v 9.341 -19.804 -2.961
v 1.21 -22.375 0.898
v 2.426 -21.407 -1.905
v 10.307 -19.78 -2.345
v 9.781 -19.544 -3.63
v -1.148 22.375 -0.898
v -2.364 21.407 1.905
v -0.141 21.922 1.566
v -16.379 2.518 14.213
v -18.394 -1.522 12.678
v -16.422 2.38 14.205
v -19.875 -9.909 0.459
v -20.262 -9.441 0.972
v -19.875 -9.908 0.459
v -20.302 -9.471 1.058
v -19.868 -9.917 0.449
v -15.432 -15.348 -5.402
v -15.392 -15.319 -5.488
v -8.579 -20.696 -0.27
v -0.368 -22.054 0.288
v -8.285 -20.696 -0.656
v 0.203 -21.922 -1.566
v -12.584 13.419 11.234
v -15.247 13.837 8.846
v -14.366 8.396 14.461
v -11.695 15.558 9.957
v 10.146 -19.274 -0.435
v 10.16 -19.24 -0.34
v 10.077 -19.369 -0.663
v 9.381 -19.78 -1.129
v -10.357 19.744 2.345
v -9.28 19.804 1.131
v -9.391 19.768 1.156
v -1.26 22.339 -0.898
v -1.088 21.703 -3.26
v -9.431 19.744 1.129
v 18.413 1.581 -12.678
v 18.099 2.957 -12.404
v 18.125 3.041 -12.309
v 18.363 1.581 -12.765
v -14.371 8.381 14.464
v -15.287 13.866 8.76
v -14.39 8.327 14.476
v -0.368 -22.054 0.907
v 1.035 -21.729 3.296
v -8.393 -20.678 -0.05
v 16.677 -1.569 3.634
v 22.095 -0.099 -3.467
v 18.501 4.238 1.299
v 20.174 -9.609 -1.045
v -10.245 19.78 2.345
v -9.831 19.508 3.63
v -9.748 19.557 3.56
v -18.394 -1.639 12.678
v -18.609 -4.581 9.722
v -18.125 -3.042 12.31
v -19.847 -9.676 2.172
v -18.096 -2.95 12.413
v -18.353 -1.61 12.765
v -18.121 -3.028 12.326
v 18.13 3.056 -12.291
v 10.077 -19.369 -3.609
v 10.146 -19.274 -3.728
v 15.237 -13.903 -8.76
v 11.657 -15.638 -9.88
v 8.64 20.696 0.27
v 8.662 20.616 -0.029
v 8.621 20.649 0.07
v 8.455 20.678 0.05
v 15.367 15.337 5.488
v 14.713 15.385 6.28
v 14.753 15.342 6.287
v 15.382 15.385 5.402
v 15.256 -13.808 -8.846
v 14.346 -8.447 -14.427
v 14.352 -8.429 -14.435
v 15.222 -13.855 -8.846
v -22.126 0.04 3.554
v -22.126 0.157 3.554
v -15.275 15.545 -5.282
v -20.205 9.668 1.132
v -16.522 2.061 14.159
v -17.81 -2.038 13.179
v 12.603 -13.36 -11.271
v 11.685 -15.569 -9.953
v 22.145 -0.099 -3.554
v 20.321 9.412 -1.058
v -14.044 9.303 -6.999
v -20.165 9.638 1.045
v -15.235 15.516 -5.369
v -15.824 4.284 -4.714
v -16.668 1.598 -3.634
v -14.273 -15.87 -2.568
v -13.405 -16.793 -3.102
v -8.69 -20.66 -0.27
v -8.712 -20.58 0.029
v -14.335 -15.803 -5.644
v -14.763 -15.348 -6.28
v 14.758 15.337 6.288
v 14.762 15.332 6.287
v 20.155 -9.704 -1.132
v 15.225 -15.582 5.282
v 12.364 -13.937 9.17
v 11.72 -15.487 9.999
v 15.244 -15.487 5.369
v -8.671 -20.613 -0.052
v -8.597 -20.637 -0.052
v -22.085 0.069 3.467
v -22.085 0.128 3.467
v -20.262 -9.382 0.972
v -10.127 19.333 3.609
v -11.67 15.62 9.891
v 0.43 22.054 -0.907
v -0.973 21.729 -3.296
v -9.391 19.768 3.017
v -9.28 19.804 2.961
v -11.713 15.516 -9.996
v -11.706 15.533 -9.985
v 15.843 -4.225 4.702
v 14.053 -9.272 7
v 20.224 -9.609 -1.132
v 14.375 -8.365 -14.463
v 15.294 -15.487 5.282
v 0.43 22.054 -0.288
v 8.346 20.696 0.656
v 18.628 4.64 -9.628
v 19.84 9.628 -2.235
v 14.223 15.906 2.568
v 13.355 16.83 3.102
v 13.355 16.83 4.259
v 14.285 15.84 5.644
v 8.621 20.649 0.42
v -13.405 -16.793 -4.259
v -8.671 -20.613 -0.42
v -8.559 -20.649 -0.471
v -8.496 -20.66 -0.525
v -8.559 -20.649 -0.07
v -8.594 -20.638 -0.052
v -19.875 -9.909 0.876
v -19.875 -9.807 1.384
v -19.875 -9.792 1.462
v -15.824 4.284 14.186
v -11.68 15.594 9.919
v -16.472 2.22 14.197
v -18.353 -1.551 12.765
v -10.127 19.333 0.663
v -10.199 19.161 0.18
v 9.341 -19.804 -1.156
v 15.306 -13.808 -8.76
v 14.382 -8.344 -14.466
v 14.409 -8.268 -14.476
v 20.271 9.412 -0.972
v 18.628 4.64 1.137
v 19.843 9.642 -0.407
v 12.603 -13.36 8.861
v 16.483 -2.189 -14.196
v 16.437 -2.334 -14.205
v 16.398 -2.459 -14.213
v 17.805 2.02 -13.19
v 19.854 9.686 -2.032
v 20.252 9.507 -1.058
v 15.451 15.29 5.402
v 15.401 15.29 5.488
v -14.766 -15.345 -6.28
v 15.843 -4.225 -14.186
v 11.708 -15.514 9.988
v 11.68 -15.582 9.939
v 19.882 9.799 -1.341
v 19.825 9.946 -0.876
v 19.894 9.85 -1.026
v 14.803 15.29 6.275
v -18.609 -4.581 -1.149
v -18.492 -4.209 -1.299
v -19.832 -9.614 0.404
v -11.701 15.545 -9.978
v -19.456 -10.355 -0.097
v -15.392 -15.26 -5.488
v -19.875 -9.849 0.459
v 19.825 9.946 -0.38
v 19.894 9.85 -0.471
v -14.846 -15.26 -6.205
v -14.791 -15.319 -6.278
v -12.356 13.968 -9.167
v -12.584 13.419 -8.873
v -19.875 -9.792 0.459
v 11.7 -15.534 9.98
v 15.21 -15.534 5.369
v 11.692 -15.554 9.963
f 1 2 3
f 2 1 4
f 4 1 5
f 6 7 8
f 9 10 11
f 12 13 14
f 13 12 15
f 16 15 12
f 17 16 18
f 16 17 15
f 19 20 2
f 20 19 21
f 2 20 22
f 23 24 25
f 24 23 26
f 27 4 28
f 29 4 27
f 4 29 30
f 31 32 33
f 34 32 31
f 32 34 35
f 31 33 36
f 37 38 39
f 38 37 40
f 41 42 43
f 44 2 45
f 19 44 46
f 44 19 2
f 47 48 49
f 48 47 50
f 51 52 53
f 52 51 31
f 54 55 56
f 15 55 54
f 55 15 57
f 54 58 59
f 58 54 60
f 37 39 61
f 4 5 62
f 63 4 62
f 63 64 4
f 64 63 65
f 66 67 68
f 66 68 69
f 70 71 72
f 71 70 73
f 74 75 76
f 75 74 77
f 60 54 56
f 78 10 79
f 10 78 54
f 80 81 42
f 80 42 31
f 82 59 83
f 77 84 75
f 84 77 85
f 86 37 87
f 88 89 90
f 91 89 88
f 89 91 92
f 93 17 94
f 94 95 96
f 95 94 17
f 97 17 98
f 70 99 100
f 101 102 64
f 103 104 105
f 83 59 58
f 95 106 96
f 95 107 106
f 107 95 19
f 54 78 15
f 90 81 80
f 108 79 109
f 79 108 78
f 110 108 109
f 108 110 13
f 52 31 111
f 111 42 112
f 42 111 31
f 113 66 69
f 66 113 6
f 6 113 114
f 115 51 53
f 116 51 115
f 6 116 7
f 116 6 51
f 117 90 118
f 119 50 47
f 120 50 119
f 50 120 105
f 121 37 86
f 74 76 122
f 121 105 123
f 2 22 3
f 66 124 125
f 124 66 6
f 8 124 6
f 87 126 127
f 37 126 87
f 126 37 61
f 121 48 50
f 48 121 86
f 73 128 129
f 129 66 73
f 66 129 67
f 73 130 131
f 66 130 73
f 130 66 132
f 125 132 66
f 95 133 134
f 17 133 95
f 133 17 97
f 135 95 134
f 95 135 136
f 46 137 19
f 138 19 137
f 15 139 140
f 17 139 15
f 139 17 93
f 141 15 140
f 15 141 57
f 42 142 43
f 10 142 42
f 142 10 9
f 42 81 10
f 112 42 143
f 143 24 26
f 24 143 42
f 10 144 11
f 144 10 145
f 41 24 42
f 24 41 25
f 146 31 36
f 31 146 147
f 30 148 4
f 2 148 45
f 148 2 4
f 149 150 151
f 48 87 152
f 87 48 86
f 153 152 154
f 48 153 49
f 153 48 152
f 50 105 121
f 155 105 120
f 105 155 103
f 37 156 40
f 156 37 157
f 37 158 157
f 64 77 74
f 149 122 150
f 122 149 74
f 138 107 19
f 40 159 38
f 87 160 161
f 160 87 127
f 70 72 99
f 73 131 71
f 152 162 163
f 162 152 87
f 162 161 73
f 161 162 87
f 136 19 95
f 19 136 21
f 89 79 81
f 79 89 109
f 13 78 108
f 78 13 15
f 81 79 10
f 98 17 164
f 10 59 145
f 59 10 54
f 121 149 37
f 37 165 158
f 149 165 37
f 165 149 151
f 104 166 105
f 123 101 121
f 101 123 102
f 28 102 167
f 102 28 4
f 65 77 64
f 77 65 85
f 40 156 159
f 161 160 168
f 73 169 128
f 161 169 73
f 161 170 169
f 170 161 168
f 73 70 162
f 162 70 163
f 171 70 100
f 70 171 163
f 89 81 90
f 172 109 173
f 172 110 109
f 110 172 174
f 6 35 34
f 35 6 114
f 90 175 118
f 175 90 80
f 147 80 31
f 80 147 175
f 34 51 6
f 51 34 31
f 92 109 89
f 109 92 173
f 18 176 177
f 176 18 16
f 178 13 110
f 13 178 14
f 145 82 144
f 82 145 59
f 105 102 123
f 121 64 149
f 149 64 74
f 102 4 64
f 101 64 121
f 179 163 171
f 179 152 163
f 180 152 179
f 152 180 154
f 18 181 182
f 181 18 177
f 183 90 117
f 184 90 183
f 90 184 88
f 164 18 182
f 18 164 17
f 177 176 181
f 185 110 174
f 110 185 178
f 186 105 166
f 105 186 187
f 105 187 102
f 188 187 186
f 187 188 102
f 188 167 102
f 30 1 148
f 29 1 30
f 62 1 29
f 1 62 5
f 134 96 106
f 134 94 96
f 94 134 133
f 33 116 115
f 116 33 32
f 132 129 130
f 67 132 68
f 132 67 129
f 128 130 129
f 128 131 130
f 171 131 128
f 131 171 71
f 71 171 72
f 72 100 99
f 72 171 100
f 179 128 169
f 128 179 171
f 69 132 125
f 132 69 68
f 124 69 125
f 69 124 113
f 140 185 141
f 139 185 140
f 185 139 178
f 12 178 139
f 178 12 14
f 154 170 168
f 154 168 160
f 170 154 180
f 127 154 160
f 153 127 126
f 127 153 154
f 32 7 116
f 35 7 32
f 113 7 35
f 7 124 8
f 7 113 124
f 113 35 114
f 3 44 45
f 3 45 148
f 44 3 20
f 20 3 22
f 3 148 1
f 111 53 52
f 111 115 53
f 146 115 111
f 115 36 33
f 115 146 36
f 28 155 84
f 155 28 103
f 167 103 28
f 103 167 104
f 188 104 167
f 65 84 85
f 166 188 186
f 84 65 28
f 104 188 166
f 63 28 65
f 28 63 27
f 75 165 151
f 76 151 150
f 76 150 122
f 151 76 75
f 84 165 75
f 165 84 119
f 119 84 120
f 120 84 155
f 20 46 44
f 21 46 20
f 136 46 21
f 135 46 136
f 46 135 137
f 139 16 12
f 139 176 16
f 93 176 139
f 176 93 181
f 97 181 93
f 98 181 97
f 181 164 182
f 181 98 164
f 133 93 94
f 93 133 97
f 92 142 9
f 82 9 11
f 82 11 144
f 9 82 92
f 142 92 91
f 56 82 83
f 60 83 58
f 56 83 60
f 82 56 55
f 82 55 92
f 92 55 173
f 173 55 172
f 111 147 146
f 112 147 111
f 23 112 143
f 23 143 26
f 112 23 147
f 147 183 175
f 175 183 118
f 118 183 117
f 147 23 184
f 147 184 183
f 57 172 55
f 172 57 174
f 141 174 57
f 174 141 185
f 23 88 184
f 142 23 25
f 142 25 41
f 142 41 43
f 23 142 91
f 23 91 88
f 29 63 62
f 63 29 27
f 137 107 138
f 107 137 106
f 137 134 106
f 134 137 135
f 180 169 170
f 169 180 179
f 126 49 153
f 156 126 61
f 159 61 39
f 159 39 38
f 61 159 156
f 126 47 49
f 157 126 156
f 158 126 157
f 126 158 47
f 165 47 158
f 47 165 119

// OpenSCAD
// Auto-generated OpenSCAD file

    inner_points = 10*[[0.9310411281195976, -1.9708956644454598, -0.48456235421219784], [-0.033699334115551816, 2.1524185182257494, -0.5933185103962525], [-0.03989472684997508, -2.195916826294735, -0.40302069458653744], [-1.0046351890851246, 1.9273973563764744, -0.5117768507705921], [1.0046351890851246, -1.9273973563764744, 0.5117768507705921], [0.03989472684997508, 2.195916826294735, 0.40302069458653744], [0.033699334115551816, -2.1524185182257494, 0.5933185103962525], [-0.9310411281195976, 1.9708956644454598, 0.48456235421219784], [0.4434653698557001, -0.46631153386828283, -2.1382142073749177], [0.21572104012363613, 0.5070709058311078, -2.1638880532059384], [-0.5274704851138725, -0.6913326957175581, -2.0566725477492573], [-0.7552148148459366, 0.2820497439818326, -2.082346393580278], [0.7552148148459366, -0.2820497439818326, 2.082346393580278], [0.5274704851138725, 0.6913326957175581, 2.0566725477492573], [-0.21572104012363613, -0.5070709058311078, 2.1638880532059384], [-0.4434653698557001, 0.46631153386828283, 2.1382142073749177], [-1.9794000073382254, -0.9850428428689444, -0.3126246729896607], [1.9058059463726982, 0.9415445347999587, -0.6837145319931293], [-1.9058059463726982, -0.9415445347999587, 0.6837145319931293], [1.9794000073382254, 0.9850428428689444, 0.3126246729896607], [-0.8589781717453047, -2.055421900397042, 0.1531838416188064], [0.8589781717453047, 2.055421900397042, -0.1531838416188064], [0.16498829102009893, -1.3528633341160017, -1.7687870534721224], [-0.4312541049635078, 1.1954849770692983, -1.83600205447966], [0.4312541049635078, -1.1954849770692983, 1.83600205447966], [-0.16498829102009893, 1.3528633341160017, 1.7687870534721224], [1.6601035855989856, 0.3501270813904757, -1.4517351994968535], [-1.8527753385768673, -0.4640071303681936, -1.1567147034721392], [1.8527753385768673, 0.4640071303681936, 1.1567147034721392], [-1.6601035855989856, -0.3501270813904757, 1.4517351994968535], [1.0576657968809553, -1.4498599519447088, -1.3286523846946763], [0.32066966437787003, 1.7000717910271093, -1.4117346950477099], [-0.5133414173557517, -1.8139518400048271, -1.1967152079212828], [-1.2503375498588372, 1.335979902966991, -1.2797975182743164], [1.2503375498588372, -1.335979902966991, 1.2797975182743164], [0.5133414173557517, 1.8139518400048271, 1.1967152079212828], [-0.32066966437787003, -1.7000717910271093, 1.4117346950477099], [-1.0576657968809553, 1.4498599519447088, 1.3286523846946763], [1.3361428757165568, -0.56330815169699, -1.6980795385974714], [0.9676448094650141, 1.0116577197889192, -1.7396206937739882], [-1.2058001934897236, -1.152421201606384, -1.4846007021984173], [-1.574298259741266, 0.4225446698795252, -1.5261418573749341], [1.574298259741266, -0.4225446698795252, 1.5261418573749341], [1.2058001934897236, 1.152421201606384, 1.4846007021984173], [-0.9676448094650141, -1.0116577197889192, 1.7396206937739882], [-1.3361428757165568, 0.56330815169699, 1.6980795385974714], [-1.332424862251081, -1.6734569141071347, -0.6405106717159389], [1.2133471702387264, 1.6030751731984023, -0.9716000262702639], [-1.2133471702387264, -1.6030751731984023, 0.9716000262702639], [1.332424862251081, 1.6734569141071347, 0.6405106717159389]];

    outer_points = 10*[[-1.5351098190494932, -1.528959426375013, -0.5401748730333669], [0.2552450391175369, 2.060125161586024, 0.8226799293199251], [-0.8609437043177841, -2.060125161586024, -0.026985812856419433], [0.929411153849246, 1.528959426375013, 1.3358689894968725], [-0.929411153849246, -1.528959426375013, -1.3358689894968725], [0.8609437043177841, 2.060125161586024, 0.026985812856419433], [-0.2552450391175369, -2.060125161586024, -0.8226799293199251], [1.5351098190494932, 1.528959426375013, 0.5401748730333669], [-1.8312961423876284, -0.15805110227230856, 1.2678494648208398], [-1.4086506920132147, 0.6892168374833194, 1.589575841638257], [-1.157130027655919, -0.6892168374833194, 1.7810385249977874], [-0.7344845772815055, 0.15805110227230856, 2.1027649018152044], [0.7344845772815055, -0.15805110227230856, -2.1027649018152044], [1.157130027655919, 0.6892168374833194, -1.7810385249977874], [1.4086506920132147, -0.6892168374833194, -1.589575841638257], [1.8312961423876284, 0.15805110227230856, -1.2678494648208398], [0.9137346872778909, -1.5486610507140617, 1.323935741932434], [-1.519433352478138, 1.5486610507140617, -0.5282416254689284], [1.519433352478138, -1.5486610507140617, 0.5282416254689284], [-0.9137346872778909, 1.5486610507140617, -1.323935741932434], [0.11792209889297003, -2.228027076027857, 0.08976471789754577], [-0.11792209889297003, 2.228027076027857, -0.08976471789754577], [-1.6489692559528297, -1.109088131929166, 1.0182788842139632], [-0.542469101682108, 1.109088131929166, 1.8605694737993177], [0.542469101682108, -1.109088131929166, -1.8605694737993177], [1.6489692559528297, 1.109088131929166, -1.0182788842139632], [-2.0124478047987377, 0.960887841826382, 0.11320938958748228], [0.42670811236404715, -0.960887841826382, 1.969944851962293], [-0.42670811236404715, 0.960887841826382, -1.969944851962293], [2.0124478047987377, -0.960887841826382, -0.11320938958748228], [-2.0221363939633368, -0.9411862174873333, 0.10583423699649219], [-0.6544269861707203, 1.8006304307180756, 1.146962662532367], [-0.9313127062639702, -1.8006304307180756, 0.9361915790174082], [0.4363967015286464, 0.9411862174873333, 1.977320004553283], [-0.4363967015286464, -0.9411862174873333, -1.977320004553283], [0.9313127062639702, 1.8006304307180756, -0.9361915790174082], [0.6544269861707203, -1.8006304307180756, -1.146962662532367], [2.0221363939633368, 0.9411862174873333, -0.10583423699649219], [-2.2044632803981354, 0.009850812169524326, 0.35540481760336906], [-1.520608576501827, 1.380759136272229, 0.8759690303713064], [-0.4394734779670596, -1.380759136272229, 1.6989512198012324], [0.2443812259292486, -0.009850812169524326, 2.2195154325691697], [-0.2443812259292486, 0.009850812169524326, -2.2195154325691697], [0.4394734779670596, 1.380759136272229, -1.6989512198012324], [1.520608576501827, -1.380759136272229, -0.8759690303713064], [2.2044632803981354, -0.009850812169524326, -0.35540481760336906], [0.04755309694678411, -1.9685323451599084, 1.0529421097713736], [-1.0275941241812274, 1.9685323451599084, 0.2345180153148959], [1.0275941241812274, -1.9685323451599084, -0.2345180153148959], [-0.04755309694678411, 1.9685323451599084, -1.0529421097713736]];

    // Convex hull for inner set (I)
    module inner_hull() {
        hull() {
            for (p = inner_points) {
                translate(p) sphere(r=0.1);
            }
        }
    }

    // Convex hull for outer set (O) minus inner hull (O \ I)
    module outer_minus_inner() {
        difference() {
            hull() {
                for (p = outer_points) {
                    translate(p) sphere(r=0.1);
                }
            }
            inner_hull(); // Subtract inner hull
        }
    }

    // Convex hull for outer set (O) minus all translated inner hulls
    module outer_minus_AllTranslationInner() {
        difference() {
            hull() {
                for (p = outer_points) {
                    translate(p) sphere(r=0.1);
                }
            }
            hull() {
                translate([0,0,50]) inner_hull();
                translate([0,0,-50]) inner_hull();
            }; // Subtract translated inner hulls
        }
    }

    // Difference between outer_minus_inner and outer_minus_AllTranslationInner
    module outer_minus_inner_diff() {
        difference() {
            // Outer minus inner
            difference() {
                hull() {
                    for (p = outer_points) {
                        translate(p) sphere(r=0.1);
                    }
                }
                inner_hull();
            }

            // Subtract Outer minus AllTranslationInner
            difference() {
                hull() {
                    for (p = outer_points) {
                        translate(p) sphere(r=0.1);
                    }
                }
                hull() {
                    translate([0,0,50]) inner_hull();
                    translate([0,0,-50]) inner_hull();
                };
            }
        }
    }

    // Rendering all with colors applied
    color([0, 1, 0, 1]) outer_minus_AllTranslationInner(); // Opaque green
    
